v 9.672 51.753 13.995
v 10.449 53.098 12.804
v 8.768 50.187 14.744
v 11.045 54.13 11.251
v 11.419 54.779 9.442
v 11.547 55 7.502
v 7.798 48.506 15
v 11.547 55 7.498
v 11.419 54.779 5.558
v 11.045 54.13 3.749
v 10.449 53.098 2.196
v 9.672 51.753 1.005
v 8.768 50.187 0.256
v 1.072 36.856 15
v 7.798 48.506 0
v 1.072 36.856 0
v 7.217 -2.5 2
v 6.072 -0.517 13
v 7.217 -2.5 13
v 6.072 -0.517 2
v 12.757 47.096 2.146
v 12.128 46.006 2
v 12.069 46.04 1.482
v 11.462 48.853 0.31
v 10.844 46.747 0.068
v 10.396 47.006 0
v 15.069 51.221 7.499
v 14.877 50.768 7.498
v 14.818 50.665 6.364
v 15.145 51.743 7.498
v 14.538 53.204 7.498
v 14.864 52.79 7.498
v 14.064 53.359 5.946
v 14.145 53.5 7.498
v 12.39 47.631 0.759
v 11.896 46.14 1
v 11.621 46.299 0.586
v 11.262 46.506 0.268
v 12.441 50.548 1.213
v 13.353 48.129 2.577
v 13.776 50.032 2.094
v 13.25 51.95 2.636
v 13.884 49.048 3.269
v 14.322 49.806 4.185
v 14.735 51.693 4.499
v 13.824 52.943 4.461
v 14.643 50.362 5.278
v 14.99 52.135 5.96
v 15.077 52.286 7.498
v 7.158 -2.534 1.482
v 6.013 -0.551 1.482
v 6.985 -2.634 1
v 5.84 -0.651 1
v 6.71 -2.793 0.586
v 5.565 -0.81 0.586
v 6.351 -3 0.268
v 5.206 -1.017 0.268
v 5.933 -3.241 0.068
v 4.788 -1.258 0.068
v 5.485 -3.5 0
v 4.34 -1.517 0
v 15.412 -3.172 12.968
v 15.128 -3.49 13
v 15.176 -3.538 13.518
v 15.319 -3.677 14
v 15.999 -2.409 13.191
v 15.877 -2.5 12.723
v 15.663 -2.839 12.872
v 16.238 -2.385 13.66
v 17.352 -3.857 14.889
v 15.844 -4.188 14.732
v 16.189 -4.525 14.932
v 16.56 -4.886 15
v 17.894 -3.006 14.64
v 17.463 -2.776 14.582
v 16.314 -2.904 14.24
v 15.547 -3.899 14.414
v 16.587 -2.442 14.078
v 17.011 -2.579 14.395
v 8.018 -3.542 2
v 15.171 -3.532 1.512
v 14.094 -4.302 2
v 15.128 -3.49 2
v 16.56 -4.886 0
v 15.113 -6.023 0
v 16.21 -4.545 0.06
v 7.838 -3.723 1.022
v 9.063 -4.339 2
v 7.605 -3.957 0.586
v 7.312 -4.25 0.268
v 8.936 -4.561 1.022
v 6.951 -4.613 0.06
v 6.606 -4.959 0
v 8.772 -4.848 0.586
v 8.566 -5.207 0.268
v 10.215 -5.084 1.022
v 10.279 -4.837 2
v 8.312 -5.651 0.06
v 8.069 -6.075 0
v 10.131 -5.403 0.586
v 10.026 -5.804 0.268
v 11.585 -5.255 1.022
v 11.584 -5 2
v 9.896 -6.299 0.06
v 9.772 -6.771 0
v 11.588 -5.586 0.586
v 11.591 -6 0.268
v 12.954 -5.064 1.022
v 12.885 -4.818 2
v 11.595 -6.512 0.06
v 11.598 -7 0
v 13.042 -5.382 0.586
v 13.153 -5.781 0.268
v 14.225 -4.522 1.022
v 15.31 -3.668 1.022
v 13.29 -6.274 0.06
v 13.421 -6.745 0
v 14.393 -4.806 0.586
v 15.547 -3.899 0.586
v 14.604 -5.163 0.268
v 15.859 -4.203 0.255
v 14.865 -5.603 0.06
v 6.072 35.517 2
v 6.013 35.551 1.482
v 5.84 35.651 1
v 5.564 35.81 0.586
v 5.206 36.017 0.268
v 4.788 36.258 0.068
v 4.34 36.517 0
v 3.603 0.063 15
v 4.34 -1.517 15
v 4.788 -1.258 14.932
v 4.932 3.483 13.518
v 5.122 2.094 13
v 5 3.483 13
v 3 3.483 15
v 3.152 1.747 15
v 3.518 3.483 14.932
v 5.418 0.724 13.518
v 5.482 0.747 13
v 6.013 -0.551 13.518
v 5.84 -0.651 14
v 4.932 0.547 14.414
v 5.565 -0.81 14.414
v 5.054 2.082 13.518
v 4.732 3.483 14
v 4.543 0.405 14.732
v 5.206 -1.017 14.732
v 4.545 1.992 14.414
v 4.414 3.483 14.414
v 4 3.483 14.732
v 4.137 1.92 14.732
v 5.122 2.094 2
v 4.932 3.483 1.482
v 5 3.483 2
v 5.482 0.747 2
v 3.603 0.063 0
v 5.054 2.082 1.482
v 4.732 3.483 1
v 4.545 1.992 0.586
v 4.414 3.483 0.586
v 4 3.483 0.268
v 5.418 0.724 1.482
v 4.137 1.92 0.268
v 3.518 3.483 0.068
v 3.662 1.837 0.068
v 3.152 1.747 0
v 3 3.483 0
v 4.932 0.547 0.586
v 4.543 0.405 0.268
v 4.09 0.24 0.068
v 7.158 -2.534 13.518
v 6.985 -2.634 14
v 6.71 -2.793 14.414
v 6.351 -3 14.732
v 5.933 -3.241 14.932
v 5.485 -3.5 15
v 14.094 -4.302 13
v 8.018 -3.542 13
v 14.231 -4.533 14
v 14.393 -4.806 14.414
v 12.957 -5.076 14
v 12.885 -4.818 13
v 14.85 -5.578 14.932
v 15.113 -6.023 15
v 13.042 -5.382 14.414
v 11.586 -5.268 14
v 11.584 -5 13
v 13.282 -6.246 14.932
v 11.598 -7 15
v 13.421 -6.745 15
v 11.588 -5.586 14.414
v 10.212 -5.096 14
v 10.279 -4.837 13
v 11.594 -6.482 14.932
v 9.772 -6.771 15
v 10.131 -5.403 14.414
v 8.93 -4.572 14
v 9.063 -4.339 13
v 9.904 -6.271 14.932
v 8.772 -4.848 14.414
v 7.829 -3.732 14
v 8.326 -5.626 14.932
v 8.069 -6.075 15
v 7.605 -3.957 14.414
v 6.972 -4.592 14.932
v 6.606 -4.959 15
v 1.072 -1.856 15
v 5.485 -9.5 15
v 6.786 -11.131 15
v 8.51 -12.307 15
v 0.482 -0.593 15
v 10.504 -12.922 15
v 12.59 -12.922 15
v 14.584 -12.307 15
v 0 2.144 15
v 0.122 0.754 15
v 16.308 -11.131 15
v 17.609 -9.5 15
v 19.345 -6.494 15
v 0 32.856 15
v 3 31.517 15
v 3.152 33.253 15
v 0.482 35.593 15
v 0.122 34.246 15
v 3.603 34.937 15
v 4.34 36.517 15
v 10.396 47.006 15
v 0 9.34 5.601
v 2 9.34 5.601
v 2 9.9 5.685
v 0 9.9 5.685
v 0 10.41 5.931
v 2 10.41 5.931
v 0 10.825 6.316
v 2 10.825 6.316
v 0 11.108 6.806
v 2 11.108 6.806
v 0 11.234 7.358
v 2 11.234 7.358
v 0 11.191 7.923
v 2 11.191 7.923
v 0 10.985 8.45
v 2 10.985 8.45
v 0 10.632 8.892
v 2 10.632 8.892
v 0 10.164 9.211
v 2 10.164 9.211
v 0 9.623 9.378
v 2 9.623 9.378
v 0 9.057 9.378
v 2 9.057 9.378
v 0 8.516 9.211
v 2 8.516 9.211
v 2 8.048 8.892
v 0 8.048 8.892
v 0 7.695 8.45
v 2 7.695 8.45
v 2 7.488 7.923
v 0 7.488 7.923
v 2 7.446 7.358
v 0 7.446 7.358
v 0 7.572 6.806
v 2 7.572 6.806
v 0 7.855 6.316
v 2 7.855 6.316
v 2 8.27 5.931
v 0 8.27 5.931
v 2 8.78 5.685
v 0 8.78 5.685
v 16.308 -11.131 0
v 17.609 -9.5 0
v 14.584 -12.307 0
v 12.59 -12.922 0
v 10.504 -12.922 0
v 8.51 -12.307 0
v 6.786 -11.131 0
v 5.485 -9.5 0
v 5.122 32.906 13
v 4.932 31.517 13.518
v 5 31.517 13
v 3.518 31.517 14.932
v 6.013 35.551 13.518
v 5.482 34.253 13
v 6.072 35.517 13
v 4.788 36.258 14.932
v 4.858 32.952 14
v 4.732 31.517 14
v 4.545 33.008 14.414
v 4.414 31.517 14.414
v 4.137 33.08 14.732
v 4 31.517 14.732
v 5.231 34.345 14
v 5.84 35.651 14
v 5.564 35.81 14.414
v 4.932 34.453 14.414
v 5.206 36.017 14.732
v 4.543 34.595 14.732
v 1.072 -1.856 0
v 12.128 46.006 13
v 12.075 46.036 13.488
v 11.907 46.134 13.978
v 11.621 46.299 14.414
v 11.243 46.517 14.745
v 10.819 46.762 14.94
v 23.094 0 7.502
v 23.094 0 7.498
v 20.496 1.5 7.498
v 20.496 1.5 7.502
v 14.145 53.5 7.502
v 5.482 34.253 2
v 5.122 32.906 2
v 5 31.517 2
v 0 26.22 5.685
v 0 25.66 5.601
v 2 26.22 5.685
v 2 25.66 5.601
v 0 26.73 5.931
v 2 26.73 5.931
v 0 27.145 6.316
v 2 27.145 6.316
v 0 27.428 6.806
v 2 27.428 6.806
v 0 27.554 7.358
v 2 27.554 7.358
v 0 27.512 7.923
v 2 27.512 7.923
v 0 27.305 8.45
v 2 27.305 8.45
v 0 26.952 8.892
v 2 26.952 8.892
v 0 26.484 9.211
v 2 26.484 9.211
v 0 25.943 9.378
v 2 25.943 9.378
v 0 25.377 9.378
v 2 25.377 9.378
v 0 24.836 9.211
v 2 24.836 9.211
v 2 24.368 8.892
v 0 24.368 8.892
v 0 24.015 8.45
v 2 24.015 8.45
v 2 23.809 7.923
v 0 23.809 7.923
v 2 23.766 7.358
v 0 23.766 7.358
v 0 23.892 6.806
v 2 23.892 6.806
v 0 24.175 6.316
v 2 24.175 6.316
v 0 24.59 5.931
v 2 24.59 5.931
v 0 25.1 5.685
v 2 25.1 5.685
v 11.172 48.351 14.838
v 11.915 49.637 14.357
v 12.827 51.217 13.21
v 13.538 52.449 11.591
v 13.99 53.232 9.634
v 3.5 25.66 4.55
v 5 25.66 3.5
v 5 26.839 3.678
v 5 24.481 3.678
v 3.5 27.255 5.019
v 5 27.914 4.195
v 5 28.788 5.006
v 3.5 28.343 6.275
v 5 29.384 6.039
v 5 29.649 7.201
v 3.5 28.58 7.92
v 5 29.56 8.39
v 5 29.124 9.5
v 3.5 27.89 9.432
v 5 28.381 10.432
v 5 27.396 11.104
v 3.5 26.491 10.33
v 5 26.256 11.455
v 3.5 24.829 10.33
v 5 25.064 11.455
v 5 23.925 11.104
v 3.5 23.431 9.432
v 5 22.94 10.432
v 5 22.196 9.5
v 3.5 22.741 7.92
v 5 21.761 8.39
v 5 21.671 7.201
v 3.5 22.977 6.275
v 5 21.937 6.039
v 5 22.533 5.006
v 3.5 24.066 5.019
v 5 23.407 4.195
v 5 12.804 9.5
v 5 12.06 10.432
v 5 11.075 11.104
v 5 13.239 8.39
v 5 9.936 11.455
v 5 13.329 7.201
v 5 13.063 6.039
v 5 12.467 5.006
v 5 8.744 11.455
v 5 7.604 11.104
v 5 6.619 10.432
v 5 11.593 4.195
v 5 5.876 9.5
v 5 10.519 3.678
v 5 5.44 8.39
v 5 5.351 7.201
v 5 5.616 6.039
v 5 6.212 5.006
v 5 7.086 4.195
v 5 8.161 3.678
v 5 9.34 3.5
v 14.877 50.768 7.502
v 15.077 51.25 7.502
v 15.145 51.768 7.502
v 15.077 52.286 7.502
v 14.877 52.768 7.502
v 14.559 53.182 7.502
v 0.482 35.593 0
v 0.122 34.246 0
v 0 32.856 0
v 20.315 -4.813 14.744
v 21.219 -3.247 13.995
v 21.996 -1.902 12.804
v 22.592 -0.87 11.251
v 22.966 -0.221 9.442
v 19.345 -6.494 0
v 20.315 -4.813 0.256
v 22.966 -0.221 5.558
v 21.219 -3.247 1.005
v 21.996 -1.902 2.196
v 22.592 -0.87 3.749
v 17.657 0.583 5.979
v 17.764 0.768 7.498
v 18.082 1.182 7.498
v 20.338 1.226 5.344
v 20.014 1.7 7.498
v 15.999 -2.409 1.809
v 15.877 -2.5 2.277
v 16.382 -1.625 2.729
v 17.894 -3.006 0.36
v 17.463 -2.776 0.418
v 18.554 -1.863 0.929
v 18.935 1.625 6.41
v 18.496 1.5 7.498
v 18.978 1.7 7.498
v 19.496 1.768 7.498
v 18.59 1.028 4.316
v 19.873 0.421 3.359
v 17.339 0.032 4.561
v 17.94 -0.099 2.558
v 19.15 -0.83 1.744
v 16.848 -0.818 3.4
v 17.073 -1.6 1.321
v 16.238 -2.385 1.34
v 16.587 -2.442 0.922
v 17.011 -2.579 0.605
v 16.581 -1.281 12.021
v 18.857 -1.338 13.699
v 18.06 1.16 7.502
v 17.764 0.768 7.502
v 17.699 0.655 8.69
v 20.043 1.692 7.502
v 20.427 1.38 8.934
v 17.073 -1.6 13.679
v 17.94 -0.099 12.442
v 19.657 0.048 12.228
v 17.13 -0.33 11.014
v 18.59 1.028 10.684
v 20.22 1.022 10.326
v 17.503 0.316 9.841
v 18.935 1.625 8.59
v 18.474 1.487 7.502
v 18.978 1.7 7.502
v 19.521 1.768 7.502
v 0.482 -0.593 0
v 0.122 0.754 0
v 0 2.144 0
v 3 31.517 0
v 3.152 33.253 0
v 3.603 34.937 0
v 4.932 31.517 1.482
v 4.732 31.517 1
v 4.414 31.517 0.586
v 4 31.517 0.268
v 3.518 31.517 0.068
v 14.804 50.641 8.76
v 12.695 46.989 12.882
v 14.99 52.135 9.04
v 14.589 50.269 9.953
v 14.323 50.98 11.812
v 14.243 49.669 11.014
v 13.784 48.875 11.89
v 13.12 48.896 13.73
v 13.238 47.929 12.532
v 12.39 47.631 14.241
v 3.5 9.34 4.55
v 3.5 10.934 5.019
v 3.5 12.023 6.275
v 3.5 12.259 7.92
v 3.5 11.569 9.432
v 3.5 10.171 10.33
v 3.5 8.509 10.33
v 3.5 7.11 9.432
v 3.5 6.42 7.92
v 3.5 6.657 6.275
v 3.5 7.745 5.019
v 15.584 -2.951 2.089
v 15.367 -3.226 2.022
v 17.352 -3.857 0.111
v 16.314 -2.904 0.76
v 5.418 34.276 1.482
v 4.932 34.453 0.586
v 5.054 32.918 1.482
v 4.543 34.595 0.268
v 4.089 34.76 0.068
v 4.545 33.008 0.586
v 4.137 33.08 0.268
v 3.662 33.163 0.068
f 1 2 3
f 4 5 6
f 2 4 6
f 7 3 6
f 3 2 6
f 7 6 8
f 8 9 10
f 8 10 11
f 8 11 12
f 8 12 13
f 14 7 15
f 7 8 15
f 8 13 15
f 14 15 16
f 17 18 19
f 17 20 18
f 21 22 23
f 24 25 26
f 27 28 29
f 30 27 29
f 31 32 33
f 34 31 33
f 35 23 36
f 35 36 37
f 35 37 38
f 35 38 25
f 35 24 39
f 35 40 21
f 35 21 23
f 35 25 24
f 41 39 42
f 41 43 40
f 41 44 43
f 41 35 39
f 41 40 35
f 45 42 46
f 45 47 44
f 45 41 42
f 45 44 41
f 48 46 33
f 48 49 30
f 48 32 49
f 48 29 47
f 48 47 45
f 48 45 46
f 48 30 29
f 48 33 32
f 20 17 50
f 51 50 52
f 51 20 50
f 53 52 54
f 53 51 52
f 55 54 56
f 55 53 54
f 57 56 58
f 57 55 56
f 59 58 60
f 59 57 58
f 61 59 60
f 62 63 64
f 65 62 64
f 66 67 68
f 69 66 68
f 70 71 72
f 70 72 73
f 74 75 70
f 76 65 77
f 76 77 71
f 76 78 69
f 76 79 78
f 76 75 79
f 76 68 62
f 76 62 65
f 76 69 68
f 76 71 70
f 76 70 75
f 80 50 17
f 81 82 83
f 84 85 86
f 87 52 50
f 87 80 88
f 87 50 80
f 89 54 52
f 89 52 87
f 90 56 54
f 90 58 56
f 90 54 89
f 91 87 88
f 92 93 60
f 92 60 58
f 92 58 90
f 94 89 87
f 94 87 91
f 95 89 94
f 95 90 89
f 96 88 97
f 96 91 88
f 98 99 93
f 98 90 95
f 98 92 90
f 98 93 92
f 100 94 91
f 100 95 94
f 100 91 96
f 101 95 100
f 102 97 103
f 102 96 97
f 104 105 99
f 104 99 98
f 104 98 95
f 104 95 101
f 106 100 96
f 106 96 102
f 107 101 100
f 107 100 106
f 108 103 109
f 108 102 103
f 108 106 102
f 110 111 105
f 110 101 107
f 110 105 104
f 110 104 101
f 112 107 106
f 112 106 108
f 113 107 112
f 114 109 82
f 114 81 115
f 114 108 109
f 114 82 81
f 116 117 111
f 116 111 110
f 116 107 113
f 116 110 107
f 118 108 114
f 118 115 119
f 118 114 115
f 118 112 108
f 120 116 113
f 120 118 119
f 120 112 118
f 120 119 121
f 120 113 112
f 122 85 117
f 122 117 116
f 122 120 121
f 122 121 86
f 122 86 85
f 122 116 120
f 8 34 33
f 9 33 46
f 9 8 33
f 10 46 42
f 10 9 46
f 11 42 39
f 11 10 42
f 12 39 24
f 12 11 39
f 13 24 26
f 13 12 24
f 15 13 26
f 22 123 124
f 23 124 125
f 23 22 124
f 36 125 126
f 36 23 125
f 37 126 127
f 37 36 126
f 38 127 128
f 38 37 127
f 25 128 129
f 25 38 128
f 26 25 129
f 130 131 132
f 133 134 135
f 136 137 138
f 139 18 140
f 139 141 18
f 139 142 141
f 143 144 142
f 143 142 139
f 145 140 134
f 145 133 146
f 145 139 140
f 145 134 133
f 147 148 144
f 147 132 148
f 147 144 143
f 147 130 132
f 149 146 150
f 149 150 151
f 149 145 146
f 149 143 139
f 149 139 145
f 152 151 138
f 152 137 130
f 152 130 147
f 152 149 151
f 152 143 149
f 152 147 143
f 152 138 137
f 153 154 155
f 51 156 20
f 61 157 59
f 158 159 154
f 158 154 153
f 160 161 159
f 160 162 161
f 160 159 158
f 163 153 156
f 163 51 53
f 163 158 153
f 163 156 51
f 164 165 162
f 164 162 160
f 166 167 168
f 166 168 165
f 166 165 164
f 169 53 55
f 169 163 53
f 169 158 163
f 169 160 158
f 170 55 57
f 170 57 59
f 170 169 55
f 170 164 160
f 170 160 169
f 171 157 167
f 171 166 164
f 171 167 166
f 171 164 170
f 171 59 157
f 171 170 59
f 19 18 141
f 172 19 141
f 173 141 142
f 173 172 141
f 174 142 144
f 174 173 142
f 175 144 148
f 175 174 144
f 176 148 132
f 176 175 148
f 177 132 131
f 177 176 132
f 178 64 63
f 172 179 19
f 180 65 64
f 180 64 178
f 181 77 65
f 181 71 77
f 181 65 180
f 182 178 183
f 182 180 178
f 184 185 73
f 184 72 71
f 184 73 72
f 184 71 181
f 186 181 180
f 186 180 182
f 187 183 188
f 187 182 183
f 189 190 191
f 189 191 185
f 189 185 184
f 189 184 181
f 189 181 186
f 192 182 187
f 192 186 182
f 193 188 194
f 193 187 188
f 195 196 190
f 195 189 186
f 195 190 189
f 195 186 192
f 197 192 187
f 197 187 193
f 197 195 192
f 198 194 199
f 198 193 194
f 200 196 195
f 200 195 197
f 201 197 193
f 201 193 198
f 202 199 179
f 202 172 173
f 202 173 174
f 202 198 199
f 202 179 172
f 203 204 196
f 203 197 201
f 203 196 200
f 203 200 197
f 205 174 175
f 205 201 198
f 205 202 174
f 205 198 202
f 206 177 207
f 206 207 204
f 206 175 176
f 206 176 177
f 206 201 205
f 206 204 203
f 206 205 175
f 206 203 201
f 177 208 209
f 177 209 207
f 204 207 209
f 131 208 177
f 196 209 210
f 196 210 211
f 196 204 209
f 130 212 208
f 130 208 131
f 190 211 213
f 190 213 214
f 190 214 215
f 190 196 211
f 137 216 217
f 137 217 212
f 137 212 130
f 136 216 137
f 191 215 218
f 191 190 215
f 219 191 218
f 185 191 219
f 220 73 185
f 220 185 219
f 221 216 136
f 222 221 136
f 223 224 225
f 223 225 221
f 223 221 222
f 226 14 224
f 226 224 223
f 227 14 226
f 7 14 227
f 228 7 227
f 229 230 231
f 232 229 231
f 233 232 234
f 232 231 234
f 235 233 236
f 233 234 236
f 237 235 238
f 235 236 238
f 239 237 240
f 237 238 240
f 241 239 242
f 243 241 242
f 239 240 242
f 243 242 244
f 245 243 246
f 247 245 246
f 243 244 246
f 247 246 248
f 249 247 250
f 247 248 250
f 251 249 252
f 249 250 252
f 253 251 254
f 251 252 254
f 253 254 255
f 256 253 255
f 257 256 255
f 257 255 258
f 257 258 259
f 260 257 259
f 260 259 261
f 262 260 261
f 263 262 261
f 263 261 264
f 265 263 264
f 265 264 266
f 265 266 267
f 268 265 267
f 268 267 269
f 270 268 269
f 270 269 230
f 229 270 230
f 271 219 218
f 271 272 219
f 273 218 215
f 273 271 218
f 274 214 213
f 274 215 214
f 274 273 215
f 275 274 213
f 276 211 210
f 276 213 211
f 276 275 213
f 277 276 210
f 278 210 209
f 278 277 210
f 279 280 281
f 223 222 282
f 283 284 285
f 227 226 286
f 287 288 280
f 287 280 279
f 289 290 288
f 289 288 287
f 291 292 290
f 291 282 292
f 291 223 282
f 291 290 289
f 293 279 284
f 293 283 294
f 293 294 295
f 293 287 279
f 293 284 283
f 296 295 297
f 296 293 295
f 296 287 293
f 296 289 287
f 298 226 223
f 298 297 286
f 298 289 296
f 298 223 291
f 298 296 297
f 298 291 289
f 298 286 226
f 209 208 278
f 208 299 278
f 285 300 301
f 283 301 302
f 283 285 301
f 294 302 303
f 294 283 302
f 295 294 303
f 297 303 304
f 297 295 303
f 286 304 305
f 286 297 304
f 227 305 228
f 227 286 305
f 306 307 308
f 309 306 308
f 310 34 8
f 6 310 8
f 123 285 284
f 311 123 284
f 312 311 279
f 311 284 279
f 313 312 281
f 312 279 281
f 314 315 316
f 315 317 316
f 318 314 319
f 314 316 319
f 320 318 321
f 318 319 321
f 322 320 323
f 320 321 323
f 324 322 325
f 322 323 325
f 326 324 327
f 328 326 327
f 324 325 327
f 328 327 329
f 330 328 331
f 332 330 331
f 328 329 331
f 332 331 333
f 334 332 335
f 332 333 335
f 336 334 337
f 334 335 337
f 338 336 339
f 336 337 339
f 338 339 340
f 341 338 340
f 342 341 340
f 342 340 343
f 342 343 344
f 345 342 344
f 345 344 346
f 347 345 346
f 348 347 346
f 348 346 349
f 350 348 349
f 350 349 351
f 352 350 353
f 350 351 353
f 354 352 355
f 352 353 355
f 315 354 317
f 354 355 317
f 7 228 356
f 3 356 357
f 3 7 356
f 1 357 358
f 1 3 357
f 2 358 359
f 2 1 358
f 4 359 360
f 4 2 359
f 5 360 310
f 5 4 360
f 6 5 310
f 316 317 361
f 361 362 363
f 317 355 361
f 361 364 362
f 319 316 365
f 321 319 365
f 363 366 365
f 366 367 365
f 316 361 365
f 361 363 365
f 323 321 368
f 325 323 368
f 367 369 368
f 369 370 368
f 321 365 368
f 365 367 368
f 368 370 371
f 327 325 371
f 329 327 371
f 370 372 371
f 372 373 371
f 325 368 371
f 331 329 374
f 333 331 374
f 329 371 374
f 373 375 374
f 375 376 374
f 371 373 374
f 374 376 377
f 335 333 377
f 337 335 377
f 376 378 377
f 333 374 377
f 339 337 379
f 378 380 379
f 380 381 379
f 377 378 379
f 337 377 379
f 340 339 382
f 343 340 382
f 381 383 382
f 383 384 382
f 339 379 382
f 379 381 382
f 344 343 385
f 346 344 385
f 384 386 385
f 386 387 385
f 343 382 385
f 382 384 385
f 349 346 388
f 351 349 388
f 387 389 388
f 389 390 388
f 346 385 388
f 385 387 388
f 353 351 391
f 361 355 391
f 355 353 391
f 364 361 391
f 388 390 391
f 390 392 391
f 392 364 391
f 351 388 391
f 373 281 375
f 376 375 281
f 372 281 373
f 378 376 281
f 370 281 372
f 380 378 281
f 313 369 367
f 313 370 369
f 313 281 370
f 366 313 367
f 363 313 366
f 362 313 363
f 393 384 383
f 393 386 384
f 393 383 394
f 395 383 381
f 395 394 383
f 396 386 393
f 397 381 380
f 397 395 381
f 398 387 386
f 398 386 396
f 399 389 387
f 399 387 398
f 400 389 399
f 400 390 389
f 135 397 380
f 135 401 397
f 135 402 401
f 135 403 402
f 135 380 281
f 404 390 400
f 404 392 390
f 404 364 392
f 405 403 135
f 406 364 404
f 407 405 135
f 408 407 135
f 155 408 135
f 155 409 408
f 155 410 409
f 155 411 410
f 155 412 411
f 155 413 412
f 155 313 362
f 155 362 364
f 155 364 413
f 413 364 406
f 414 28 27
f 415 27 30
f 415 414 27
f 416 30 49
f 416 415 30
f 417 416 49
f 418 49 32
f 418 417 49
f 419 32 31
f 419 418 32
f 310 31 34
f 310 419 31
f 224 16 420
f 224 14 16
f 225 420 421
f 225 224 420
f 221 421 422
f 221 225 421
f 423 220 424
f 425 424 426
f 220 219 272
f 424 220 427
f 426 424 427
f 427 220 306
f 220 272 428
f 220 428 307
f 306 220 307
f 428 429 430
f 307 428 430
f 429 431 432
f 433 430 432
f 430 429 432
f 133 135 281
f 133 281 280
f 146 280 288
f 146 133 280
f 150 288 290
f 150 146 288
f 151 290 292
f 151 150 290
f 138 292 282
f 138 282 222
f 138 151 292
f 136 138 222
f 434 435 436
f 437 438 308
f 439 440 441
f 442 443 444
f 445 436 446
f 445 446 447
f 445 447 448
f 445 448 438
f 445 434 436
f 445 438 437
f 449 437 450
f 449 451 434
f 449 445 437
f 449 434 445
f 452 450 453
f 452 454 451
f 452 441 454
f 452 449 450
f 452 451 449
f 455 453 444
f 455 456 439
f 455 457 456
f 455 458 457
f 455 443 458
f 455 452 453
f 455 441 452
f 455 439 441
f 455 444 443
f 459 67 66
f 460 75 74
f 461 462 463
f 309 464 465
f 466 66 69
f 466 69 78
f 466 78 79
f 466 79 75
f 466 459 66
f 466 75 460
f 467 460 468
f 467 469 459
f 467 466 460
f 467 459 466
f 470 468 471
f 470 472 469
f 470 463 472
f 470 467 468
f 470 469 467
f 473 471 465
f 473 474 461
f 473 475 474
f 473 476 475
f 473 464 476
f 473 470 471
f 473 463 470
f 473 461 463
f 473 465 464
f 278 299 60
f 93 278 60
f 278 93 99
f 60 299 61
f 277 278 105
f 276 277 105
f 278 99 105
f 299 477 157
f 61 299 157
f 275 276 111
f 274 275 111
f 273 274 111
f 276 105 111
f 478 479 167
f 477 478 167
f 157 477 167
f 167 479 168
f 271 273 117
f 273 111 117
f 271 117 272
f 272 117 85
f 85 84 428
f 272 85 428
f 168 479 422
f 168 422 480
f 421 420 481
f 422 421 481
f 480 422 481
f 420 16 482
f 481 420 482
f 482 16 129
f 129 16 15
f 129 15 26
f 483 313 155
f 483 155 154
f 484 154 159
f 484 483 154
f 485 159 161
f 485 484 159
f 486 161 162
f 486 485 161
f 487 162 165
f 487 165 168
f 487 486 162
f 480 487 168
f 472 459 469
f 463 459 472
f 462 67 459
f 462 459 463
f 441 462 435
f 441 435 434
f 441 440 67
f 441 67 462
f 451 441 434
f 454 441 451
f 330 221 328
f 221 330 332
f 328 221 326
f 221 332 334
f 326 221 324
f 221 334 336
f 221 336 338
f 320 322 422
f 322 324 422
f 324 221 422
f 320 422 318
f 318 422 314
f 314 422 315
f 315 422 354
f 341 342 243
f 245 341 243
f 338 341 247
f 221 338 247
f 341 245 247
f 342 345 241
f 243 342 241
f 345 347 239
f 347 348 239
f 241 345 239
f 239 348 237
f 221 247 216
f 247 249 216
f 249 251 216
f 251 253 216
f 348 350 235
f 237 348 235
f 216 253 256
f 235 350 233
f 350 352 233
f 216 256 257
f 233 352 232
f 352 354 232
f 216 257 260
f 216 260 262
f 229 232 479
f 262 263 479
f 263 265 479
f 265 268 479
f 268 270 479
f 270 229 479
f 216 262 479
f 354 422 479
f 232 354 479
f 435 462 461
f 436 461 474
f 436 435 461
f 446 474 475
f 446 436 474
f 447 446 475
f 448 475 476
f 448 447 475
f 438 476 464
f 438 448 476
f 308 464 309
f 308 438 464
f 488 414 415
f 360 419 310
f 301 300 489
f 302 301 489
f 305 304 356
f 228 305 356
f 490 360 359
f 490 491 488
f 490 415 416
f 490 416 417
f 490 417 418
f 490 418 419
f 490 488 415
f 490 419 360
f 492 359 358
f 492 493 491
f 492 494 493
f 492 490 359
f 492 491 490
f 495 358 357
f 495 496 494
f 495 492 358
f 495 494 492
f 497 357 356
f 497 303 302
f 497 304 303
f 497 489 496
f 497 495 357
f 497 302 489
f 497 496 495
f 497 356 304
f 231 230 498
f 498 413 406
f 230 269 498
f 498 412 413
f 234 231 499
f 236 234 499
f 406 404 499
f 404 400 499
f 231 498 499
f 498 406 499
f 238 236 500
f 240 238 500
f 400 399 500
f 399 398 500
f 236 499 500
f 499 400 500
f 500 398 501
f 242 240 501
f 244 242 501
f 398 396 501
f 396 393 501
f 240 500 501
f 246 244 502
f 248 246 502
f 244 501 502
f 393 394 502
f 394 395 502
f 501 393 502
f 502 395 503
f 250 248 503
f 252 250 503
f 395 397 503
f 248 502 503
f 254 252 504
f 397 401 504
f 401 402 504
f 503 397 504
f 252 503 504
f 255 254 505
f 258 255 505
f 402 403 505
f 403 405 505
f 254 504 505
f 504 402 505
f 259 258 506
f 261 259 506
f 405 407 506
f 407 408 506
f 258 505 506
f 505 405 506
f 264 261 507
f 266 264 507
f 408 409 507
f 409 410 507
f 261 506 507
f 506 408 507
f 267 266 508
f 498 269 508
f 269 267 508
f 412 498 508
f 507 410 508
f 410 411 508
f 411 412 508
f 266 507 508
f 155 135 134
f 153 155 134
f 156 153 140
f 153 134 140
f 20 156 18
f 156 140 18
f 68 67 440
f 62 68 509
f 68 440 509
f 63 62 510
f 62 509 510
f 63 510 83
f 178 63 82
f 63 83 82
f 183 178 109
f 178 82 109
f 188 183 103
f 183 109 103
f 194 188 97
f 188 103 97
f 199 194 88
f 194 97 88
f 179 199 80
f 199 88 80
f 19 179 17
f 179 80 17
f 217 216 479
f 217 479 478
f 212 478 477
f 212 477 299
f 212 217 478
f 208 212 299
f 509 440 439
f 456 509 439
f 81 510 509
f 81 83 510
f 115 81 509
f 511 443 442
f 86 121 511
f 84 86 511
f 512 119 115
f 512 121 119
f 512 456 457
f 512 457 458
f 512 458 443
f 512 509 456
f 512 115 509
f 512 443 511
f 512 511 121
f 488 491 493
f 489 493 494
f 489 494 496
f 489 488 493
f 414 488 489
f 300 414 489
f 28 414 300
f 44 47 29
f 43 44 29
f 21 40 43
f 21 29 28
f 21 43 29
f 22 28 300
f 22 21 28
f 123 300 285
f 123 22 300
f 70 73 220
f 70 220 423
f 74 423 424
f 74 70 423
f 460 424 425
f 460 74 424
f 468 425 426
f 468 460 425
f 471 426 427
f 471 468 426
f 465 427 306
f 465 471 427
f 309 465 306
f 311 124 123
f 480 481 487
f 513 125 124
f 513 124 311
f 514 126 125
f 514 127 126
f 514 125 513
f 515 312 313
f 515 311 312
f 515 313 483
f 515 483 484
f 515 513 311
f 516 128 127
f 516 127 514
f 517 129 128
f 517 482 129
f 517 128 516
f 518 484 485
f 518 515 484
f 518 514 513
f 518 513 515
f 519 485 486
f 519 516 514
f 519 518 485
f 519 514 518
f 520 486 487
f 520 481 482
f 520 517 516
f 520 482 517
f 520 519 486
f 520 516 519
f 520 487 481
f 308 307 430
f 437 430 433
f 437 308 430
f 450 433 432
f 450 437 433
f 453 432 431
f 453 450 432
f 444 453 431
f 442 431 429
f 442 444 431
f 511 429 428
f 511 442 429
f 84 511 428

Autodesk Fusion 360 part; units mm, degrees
sketch "Sketch1" plane through (0, 0, 0) normal (0, 0, 1) x (1, 0, 0)
  line L0 (11.547, 55) -> (0, 35)
  line L1 (0, 35) -> (0, 0)
  line L2 (0, 0) -> (5.4848, -9.5)
  line L3 (17.6092, -9.5) -> (23.094, 0)
  line L4 (15.8771, 52.5) -> (5, 33.6603)
  line L5 (5, 33.6603) -> (5, 1.3397)
  line L6 (5, 1.3397) -> (7.2169, -2.5)
  line L7 (15.8771, -2.5) -> (18.7639, 2.5)
  line L8 (15.8771, 52.5) -> (11.547, 55)
  line L9 (23.094, 0) -> (18.7639, 2.5)
  arc A0 (7.2169, -2.5) -> (15.8771, -2.5) centre (11.547, 0) ccw
  arc A1 (5.4848, -9.5) -> (17.6092, -9.5) centre (11.547, -6) ccw
  point P0 (11.547, -20)
  dimension "d1" = 35
  dimension "d2" = 20
  dimension "d3" = 20
  dimension "d4" = 20
  dimension "d5" = 150
  dimension "d6" = 150
  dimension "d8" = 5
  dimension "d9" = 7
sketch "Sketch2" plane through (0, 0, 0) normal (0, 0, 1) x (1, 0, 0)
sketch "Sketch3" plane through (0, 0, 0) normal (0, 0, 1) x (1, 0, 0)
sketch "Sketch4" plane through (0, 0, 0) normal (0, 0, 1) x (1, 0, 0)
sketch "Sketch5" plane through (0, 0, 0) normal (0, 0, 1) x (1, 0, 0)
sketch "Sketch6" plane through (0, 0, 0) normal (0, 0, 1) x (1, 0, 0)
sketch "Sketch7" plane through (0, 0, 0) normal (0, 0, 1) x (1, 0, 0)
sketch "Sketch8" plane through (0, 0, 0) normal (0, 0, 1) x (1, 0, 0)
extrude "Extrude1" add sketch "Sketch1" along normal blind 15
sketch "Sketch9" plane through (5, 0, 0) normal (1, 0, 0) x (0, 0, -1)
  line L0 (0, 1.3397) -> (0, 33.6603)
  line L1 (0, 33.6603) -> (-15, 33.6603)
  line L2 (-15, 33.6603) -> (-15, 1.3397)
  line L3 (-15, 1.3397) -> (0, 1.3397)
  line L4 (-7.5, 33.6603) -> (-7.5, 1.3397) construction
  line L5 (0, 17.5) -> (-15, 17.5) construction
  circle A0 centre (-7.5, 25.6603) radius 4
  circle A1 centre (-7.5, 9.3397) radius 4
  dimension "d12" = 8
  dimension "d13" = 8
extrude "Extrude2" cut sketch "Sketch9" against normal blind 3 draft -35 contours A0 | A1
extrude "Extrude3" cut 2 faces at (2, 25.2296, 7.9641) (2, 8.5998, 6.9769) along direction (-1, 0, 0) through all
fillet "Fillet1" radius 7.5 4 edges at (13.7121, 53.75, 15) (13.7121, 53.75, 0) (20.9289, 1.25, 15) (20.9289, 1.25, 0)
fillet "Fillet2" radius 8 4 edges at (5, 33.6603, 7.5) (5, 1.3397, 7.5) (0, 0, 7.5) (0, 35, 7.5)
fillet "Fillet3" radius 2 16 edges at (5.2726, 33.5872, 15) (9.0995, 40.7607, 15) (15.8771, 52.5, 7.5) (9.0995, 40.7607, 0) (5.2726, 33.5872, 0) (5, 17.5, 0) (5.2726, 1.4128, 0) (6.6443, -1.5083, 0) (10.6702, -4.9225, 0) (15.3815, -3.2072, 0.0512) (18.7639, 2.5, 7.5) (15.3815, -3.2072, 14.9488) (10.6702, -4.9225, 15) (6.6443, -1.5083, 15) (5.2726, 1.4128, 15) (5, 17.5, 15)
equation "d3 = d2"
equation "d4 = d2"
equation "d6 = d5"
